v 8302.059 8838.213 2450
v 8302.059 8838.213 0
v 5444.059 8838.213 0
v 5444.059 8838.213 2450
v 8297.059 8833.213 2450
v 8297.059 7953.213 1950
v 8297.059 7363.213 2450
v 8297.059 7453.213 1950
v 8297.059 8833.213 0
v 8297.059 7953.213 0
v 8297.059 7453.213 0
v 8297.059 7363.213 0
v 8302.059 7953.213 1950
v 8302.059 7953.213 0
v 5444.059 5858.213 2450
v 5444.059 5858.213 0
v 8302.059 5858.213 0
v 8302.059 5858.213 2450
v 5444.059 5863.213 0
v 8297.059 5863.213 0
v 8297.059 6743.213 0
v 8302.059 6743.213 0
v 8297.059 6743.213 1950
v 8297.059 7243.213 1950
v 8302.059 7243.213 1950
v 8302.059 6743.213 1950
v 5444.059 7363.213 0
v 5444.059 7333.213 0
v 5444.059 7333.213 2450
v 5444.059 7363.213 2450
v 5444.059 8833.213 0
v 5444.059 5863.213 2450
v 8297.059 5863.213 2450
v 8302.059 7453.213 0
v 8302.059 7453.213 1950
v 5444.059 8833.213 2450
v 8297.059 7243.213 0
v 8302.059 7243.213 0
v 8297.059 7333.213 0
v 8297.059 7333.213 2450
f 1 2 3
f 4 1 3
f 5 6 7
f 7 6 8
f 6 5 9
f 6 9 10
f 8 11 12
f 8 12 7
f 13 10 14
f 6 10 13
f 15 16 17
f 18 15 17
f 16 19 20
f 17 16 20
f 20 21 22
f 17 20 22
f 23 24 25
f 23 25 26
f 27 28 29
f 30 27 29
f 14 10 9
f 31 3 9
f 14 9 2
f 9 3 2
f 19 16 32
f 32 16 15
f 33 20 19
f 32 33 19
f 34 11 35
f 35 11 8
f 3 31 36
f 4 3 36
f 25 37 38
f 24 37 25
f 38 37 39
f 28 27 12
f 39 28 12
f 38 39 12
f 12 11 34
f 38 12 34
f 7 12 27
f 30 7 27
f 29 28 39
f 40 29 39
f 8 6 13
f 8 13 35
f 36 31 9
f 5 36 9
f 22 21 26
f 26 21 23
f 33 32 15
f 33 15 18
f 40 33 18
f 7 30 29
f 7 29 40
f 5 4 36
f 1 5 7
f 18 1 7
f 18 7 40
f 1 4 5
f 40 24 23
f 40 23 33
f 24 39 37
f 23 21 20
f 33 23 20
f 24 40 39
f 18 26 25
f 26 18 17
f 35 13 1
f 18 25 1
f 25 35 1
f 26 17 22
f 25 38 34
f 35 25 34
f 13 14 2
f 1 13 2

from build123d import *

# Parameters (mm, degrees)
F1_DEPTH = 2450
F2_W     = 500
F2_H     = 1950
F3_DEPTH = 300
F4_W     = 101
F4_H     = 2450
F5_DEPTH = 460
F7_DEPTH = 4630


with BuildPart() as f1:
    # F0 (on Top) → F1 (new body)
    with BuildSketch(Plane.XY):
        Polygon((5348.059315, 5858.212916), (8302.059315, 5858.212916), (8302.059315, 7338.212916), (8302.059315, 7358.212916), (8302.059315, 8838.212916), (5348.059315, 8838.212916), (5348.059315, 8833.212852), (8297.059252, 8833.212852), (8297.059252, 7363.21298), (5343.059252, 7363.21298), (5343.059252, 7333.212852), (8297.059252, 7333.212852), (8297.059252, 5863.21298), (5348.059315, 5863.21298), align=None)
    extrude(amount=F1_DEPTH)

    # F2 (on face) → F3 (cut)
    with BuildSketch(Plane(origin=(8297.059252, 0, 0), x_dir=(0, -1, 0), z_dir=(-1, 0, 0))):
        with Locations((-7703.21298, 975)):
            Rectangle(F2_W, F2_H)
        with Locations((-6993.212852, 975)):
            Rectangle(F2_W, F2_H)
    extrude(amount=-F3_DEPTH, mode=Mode.SUBTRACT)

    # F4 (on face) → F5 (cut)
    with BuildSketch(Plane.XZ.offset(-7333.212852)):
        with Locations((5393.559252, 1225)):
            Rectangle(F4_W, F4_H)
    extrude(amount=-F5_DEPTH, mode=Mode.SUBTRACT)

    # F6 (on face) → F7 (cut)
    with BuildSketch(Plane.XZ.offset(-5858.212916)):
        Polygon((5444.059252, 0), (5444.059252, 2450), (5444.059252, 2649.641752), (5038.322449, 2649.641752), (5038.322449, -210.067511), (5444.059252, -140.881062), align=None)
    extrude(amount=-F7_DEPTH, mode=Mode.SUBTRACT)


solid = f1.part
